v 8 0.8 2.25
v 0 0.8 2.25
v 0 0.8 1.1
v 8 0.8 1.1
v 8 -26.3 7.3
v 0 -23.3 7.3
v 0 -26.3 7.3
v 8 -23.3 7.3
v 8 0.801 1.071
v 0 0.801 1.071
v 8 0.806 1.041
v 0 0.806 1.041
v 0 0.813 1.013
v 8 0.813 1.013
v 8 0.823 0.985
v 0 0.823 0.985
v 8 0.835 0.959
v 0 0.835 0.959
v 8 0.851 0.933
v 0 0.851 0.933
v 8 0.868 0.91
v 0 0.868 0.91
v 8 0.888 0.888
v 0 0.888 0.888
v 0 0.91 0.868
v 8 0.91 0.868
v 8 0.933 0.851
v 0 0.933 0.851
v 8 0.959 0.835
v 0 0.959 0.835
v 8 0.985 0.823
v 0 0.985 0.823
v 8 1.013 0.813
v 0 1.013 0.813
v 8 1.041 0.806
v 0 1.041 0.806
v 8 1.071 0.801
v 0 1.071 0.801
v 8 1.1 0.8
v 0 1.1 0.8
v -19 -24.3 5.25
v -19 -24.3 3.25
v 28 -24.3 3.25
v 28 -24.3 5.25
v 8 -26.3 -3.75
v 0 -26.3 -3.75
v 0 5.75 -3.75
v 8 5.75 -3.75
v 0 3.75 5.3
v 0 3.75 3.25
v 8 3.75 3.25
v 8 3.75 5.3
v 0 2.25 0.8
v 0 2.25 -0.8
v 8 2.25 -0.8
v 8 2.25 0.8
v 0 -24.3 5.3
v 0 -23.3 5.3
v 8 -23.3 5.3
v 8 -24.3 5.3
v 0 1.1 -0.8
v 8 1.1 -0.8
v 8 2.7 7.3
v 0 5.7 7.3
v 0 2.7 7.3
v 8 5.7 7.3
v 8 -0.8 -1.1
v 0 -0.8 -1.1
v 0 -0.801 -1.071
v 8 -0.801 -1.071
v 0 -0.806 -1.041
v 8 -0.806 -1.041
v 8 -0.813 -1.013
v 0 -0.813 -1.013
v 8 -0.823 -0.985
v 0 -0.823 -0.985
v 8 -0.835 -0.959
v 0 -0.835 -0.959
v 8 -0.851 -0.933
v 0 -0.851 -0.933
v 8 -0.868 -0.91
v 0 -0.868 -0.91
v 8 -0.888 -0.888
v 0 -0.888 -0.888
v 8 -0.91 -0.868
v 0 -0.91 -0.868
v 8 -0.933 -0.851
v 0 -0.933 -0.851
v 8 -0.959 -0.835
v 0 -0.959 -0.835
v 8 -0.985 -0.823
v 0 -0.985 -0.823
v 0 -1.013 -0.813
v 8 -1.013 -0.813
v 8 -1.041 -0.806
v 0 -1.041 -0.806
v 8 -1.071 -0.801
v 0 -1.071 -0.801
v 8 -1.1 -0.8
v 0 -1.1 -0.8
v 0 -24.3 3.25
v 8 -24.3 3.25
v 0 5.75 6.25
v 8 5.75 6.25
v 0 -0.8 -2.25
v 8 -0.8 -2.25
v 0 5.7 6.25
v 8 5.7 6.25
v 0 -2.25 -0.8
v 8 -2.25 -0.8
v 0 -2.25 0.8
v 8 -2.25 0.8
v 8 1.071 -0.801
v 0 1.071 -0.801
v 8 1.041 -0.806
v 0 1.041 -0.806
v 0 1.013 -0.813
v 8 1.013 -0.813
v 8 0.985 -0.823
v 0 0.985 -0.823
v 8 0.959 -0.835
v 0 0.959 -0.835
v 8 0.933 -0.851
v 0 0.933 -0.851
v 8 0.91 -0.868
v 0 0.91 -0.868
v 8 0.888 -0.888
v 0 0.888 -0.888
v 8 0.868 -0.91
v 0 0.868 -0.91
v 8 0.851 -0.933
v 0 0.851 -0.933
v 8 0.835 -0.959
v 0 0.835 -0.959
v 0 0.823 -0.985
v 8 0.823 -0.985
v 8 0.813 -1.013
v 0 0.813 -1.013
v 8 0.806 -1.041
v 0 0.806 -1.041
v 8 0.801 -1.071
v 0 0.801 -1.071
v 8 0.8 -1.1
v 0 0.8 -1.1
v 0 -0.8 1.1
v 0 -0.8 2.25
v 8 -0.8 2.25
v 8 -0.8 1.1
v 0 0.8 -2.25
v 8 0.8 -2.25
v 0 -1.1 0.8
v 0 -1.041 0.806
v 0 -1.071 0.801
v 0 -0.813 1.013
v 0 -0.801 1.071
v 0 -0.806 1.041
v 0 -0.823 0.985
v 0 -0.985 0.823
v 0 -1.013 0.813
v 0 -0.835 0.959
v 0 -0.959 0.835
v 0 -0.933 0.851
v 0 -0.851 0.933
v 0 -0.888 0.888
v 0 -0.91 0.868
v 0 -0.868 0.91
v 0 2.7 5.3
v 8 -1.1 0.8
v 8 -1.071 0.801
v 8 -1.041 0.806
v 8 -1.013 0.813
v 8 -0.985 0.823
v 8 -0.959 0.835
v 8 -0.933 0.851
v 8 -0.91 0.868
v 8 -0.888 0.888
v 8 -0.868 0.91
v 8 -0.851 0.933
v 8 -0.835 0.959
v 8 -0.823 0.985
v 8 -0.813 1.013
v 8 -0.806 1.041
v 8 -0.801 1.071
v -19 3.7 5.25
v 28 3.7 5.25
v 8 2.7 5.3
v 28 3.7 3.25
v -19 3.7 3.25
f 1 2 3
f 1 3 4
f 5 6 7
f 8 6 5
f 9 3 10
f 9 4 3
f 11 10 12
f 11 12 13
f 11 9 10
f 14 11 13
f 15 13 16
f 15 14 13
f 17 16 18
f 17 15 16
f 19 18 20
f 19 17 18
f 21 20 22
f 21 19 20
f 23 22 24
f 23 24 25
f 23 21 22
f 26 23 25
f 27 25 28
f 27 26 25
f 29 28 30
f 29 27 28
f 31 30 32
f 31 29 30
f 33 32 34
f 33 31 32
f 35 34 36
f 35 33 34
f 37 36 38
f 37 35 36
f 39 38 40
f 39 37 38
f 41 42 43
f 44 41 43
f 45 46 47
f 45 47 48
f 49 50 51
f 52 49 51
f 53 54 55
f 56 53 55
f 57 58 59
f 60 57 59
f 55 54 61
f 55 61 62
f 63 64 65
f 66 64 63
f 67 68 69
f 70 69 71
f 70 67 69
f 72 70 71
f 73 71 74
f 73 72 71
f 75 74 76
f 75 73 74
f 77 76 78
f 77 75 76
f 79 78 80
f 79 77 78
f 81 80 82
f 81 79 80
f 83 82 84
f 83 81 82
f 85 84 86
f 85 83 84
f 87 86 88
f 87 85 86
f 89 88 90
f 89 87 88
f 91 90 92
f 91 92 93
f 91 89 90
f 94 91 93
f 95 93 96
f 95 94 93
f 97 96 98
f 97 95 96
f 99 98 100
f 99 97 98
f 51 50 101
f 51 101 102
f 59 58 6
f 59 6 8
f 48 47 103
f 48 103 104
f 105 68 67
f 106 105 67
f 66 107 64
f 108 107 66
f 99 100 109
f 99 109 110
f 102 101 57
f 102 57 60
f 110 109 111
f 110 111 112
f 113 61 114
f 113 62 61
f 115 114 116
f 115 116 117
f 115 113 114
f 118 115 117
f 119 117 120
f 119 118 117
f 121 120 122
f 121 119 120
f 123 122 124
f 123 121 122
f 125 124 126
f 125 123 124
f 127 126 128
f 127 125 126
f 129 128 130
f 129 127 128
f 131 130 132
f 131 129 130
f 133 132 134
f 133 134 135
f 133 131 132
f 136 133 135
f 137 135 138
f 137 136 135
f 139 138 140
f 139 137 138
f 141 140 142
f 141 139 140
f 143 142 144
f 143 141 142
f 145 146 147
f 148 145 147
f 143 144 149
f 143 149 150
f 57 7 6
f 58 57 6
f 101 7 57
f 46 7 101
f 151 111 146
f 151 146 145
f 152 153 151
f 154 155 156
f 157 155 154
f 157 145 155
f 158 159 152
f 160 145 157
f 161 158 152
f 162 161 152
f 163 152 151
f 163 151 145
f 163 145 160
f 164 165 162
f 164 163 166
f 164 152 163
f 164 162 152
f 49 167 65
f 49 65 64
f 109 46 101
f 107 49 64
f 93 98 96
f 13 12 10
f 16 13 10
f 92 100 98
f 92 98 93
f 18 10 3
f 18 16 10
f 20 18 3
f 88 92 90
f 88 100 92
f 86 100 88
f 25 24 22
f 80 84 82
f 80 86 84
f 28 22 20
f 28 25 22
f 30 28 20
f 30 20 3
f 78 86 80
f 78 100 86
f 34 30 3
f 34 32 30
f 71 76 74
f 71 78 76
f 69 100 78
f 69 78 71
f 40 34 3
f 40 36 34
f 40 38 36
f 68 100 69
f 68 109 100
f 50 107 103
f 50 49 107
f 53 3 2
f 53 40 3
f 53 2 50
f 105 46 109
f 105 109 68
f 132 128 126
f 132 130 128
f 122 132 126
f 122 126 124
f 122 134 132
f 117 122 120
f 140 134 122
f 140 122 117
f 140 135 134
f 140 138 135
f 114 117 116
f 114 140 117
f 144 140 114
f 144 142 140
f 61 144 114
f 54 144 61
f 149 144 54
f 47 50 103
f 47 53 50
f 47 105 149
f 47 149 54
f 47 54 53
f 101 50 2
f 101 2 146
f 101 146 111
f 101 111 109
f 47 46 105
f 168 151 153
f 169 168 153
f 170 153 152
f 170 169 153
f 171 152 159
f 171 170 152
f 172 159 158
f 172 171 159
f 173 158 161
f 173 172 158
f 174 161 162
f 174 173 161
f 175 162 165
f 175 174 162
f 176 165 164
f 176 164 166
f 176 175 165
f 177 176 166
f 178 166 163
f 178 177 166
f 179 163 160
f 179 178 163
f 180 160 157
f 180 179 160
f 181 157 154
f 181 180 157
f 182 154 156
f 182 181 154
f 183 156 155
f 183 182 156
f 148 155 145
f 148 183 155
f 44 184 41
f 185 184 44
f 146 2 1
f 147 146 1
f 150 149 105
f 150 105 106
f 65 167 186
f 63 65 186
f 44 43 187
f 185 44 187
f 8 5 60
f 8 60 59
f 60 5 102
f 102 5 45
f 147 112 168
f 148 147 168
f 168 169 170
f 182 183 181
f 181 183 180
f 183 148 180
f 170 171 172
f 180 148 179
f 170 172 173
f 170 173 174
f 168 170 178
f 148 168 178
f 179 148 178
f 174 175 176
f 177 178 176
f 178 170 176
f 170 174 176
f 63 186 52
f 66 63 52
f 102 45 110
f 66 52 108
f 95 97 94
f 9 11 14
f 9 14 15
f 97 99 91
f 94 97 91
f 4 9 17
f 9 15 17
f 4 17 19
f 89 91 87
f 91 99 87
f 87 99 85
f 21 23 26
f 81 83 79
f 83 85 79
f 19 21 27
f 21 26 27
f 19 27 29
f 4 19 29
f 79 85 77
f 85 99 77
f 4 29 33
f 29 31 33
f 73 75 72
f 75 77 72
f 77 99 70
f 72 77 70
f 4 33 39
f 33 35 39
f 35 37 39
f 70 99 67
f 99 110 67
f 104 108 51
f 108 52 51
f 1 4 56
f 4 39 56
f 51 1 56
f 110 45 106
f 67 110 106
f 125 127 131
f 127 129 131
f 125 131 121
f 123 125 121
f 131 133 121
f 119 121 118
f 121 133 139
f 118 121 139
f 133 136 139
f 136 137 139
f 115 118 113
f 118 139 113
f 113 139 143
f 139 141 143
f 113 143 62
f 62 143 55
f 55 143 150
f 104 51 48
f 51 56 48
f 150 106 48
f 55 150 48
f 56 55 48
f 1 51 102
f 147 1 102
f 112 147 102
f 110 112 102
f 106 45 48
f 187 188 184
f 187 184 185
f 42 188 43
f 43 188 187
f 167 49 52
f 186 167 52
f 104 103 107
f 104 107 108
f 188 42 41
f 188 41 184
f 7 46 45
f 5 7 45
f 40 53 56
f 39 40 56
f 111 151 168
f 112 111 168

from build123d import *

# Parameters (mm, degrees)
BOX004_W     = 47
BOX004_H     = 28
BOX004_DEPTH = 2
BOX005_W     = 8
BOX005_H     = 3
BOX005_DEPTH = 2
BOX001_W     = 80
BOX001_H     = 4.5
BOX001_DEPTH = 1.6
BOX_W        = 80
BOX_H        = 4.5
BOX_DEPTH    = 1.6
BOX002_W     = 8
BOX002_H     = 7.5
BOX002_DEPTH = 7
FILLET_R     = 0.3
BOX003_W     = 8
BOX003_H     = 2
BOX003_DEPTH = 10
BOX006_W     = 8
BOX006_H     = 21
BOX006_DEPTH = 7
BOX007_W     = 8
BOX007_H     = 3
BOX007_DEPTH = 2
BOX008_W     = 8
BOX008_H     = 2
BOX008_DEPTH = 10


with BuildPart() as bat:
    # Box004 → Box004 (new body)
    with BuildSketch(Plane(origin=(-19, -24.3, 3.25), x_dir=(1, 0, 0), z_dir=(0, 0, 1))):
        with Locations((23.5, 14)):
            Rectangle(BOX004_W, BOX004_H)
    extrude(amount=BOX004_DEPTH)


with BuildPart() as cube005:
    # Box005 → Box005 (new body)
    with BuildSketch(Plane(origin=(0, 2.7, 5.3), x_dir=(1, 0, 0), z_dir=(0, 0, 1))):
        with Locations((4, 1.5)):
            Rectangle(BOX005_W, BOX005_H)
    extrude(amount=BOX005_DEPTH)


with BuildPart() as cube001:
    # Box001 → Box001 (new body)
    with BuildSketch(Plane(origin=(0, 0.8, -2.25), x_dir=(1, 0, 0), z_dir=(0, -1, 0))):
        with Locations((40, 2.25)):
            Rectangle(BOX001_W, BOX001_H)
    extrude(amount=BOX001_DEPTH)


with BuildPart() as fusion:
    # Box → Box (new body)
    with BuildSketch(Plane(origin=(0, -2.25, -0.8), x_dir=(1, 0, 0), z_dir=(0, 0, 1))):
        with Locations((40, 2.25)):
            Rectangle(BOX_W, BOX_H)
    extrude(amount=BOX_DEPTH)

    # Fusion: union Cube001
    add(cube001.part)


with BuildPart() as fusion_1:
    # Fusion placement: moved
    add(fusion.part.moved(Location((-5, 0, 0))))


with BuildPart() as fillet_body:
    # Box002 → Box002 (new body)
    with BuildSketch(Plane(origin=(0, -3.75, -3.75), x_dir=(1, 0, 0), z_dir=(0, 0, 1))):
        with Locations((4, 3.75)):
            Rectangle(BOX002_W, BOX002_H)
    extrude(amount=BOX002_DEPTH)

    # Cut: cut Fusion
    add(fusion_1.part, mode=Mode.SUBTRACT)

    # Fillet
    fillet_edges = [fillet_body.edges().sort_by_distance(p)[0] for p in [
        (4, -0.8, 0.8),
        (4, -0.8, -0.8),
        (4, 0.8, -0.8),
        (4, 0.8, 0.8),
    ]]
    fillet(fillet_edges, radius=FILLET_R)


with BuildPart() as fusion001:
    # Box003 → Box003 (new body)
    with BuildSketch(Plane(origin=(0, 3.75, -3.75), x_dir=(1, 0, 0), z_dir=(0, 0, 1))):
        with Locations((4, 1)):
            Rectangle(BOX003_W, BOX003_H)
    extrude(amount=BOX003_DEPTH)

    # Fusion001: union Cube005, Fillet body
    add(cube005.part)
    add(fillet_body.part)


with BuildPart() as fusion002:
    # Box006 → Box006 (new body)
    with BuildSketch(Plane(origin=(0, -24.3, -3.75), x_dir=(1, 0, 0), z_dir=(0, 0, 1))):
        with Locations((4, 10.5)):
            Rectangle(BOX006_W, BOX006_H)
    extrude(amount=BOX006_DEPTH)

    # Fusion002: union Fusion001
    add(fusion001.part)


with BuildPart() as cube007:
    # Box007 → Box007 (new body)
    with BuildSketch(Plane(origin=(0, -26.3, 5.3), x_dir=(1, 0, 0), z_dir=(0, 0, 1))):
        with Locations((4, 1.5)):
            Rectangle(BOX007_W, BOX007_H)
    extrude(amount=BOX007_DEPTH)


with BuildPart() as fusion004:
    # Box008 → Box008 (new body)
    with BuildSketch(Plane(origin=(0, -26.3, -3.75), x_dir=(1, 0, 0), z_dir=(0, 0, 1))):
        with Locations((4, 1)):
            Rectangle(BOX008_W, BOX008_H)
    extrude(amount=BOX008_DEPTH)

    # Fusion003: union Cube007
    add(cube007.part)

    # Fusion004: union Fusion002
    add(fusion002.part)


solid = Compound([bat.part, fusion004.part])
